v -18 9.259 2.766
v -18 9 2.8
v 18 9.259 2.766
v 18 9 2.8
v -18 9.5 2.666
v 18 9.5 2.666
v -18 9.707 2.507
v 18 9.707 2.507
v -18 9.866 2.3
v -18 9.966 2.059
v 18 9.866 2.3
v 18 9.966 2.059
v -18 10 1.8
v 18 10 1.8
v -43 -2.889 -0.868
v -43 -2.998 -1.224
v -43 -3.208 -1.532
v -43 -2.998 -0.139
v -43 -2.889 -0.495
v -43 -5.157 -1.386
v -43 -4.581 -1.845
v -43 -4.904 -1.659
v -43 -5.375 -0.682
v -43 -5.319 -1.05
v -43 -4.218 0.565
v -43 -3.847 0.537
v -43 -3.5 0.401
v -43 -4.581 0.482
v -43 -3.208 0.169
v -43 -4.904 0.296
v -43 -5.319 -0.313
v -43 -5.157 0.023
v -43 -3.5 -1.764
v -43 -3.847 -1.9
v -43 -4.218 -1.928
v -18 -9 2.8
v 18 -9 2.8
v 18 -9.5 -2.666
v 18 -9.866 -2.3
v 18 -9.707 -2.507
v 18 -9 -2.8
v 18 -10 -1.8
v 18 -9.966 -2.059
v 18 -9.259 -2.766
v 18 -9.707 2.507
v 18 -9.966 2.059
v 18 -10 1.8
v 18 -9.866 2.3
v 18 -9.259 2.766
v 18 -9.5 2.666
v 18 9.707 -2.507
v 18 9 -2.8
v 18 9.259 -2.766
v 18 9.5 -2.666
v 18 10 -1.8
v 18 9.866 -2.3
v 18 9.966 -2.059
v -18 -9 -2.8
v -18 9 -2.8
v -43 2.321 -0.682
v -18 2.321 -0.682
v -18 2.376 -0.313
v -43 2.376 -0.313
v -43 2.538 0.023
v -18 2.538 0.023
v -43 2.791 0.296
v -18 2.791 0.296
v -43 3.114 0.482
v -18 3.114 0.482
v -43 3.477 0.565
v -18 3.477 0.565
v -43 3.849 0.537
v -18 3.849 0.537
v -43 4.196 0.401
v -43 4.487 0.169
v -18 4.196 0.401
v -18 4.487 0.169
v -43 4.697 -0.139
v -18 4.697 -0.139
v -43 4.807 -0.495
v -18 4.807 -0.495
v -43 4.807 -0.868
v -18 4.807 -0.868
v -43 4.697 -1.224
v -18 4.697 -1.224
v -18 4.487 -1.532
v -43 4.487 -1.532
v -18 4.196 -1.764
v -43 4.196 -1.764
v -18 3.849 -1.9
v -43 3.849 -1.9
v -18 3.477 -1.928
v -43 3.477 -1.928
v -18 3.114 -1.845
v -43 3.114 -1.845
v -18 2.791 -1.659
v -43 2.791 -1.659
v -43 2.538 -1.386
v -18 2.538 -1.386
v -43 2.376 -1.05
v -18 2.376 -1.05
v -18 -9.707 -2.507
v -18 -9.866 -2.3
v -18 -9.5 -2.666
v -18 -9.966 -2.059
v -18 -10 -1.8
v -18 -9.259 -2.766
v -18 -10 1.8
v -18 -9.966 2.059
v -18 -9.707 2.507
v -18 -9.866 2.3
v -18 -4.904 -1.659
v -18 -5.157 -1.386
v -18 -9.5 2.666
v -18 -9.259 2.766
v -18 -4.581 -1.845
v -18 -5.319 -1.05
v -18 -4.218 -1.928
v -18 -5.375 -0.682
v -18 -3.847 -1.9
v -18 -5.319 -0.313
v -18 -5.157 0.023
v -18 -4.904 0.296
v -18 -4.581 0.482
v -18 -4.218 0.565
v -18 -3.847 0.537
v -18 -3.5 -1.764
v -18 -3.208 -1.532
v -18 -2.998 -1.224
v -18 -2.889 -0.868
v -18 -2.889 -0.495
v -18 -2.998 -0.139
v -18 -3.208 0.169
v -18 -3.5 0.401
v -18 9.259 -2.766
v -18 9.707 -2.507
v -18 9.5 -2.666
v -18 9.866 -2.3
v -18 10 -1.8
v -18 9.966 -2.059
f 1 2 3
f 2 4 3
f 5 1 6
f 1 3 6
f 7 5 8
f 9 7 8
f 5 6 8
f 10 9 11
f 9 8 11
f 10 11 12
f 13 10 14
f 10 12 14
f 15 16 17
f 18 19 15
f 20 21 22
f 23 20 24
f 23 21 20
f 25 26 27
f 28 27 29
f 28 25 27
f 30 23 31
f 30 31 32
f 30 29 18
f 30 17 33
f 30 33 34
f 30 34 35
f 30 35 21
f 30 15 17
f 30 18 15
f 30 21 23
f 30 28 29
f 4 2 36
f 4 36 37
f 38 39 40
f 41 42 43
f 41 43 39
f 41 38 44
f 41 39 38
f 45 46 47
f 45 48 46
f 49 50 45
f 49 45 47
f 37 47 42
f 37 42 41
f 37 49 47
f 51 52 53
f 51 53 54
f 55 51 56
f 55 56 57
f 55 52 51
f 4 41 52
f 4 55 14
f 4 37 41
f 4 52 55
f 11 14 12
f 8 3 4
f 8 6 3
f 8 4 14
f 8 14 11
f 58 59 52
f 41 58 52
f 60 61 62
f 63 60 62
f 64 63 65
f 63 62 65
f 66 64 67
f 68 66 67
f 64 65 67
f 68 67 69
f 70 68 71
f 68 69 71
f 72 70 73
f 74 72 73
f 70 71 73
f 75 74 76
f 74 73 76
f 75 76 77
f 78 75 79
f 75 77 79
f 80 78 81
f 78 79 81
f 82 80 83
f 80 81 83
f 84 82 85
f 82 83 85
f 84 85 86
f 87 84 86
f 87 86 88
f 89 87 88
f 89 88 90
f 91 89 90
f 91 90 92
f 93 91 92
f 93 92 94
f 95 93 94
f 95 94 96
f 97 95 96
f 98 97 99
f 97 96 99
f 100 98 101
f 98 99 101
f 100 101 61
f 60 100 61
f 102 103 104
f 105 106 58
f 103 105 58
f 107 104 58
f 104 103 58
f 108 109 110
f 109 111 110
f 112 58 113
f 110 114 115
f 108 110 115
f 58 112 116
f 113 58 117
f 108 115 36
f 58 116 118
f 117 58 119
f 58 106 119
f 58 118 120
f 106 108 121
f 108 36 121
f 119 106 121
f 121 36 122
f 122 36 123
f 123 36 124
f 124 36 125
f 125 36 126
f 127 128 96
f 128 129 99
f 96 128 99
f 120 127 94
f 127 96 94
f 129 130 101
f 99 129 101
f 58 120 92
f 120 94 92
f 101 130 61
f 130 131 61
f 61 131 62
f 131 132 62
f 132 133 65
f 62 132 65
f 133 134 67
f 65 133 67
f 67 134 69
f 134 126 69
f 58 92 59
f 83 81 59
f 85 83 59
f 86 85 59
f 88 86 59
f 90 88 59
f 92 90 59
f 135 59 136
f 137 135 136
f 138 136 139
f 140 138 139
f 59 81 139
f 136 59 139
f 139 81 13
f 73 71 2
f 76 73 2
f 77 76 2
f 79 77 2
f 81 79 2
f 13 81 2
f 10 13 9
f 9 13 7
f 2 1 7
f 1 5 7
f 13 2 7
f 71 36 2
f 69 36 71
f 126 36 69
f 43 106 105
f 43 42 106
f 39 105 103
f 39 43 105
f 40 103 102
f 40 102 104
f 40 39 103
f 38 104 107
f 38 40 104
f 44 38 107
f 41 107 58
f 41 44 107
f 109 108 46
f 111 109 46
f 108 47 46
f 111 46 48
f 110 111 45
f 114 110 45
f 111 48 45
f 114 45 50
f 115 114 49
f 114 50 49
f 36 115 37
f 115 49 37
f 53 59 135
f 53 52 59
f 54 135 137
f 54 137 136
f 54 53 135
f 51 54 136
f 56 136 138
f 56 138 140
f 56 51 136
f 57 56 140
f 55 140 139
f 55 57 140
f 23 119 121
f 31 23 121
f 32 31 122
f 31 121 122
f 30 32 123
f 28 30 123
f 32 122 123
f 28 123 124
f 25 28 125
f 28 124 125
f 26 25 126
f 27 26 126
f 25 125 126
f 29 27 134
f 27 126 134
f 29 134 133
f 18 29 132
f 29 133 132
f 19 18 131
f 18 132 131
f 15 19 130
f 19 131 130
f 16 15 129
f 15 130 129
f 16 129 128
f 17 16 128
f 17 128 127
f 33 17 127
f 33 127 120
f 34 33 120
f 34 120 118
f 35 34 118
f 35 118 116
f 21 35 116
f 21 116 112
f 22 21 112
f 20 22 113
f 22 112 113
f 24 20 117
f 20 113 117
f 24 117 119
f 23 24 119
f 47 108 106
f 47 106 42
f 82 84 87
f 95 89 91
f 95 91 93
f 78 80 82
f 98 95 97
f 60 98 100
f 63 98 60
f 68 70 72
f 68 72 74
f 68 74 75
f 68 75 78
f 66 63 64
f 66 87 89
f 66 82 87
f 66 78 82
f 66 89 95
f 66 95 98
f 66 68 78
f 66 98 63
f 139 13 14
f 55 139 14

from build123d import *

# Parameters (mm, degrees)
F0_W     = 36
F0_H     = 20
F1_DEPTH = 2.8
F2_R     = 1.25
F3_DEPTH = 25
F4_R     = 1


with BuildPart() as f1:
    # F0 (on Top) → F1 (new body, symmetric)
    with BuildSketch(Plane.XY):
        Rectangle(F0_W, F0_H)
    extrude(amount=F1_DEPTH, both=True)

    # F2 (on face) → F3 (join)
    with BuildSketch(Plane(origin=(-18, 0, 0), x_dir=(0, -1, 0), z_dir=(-1, 0, 0))):
        with Locations((-3.5708139185, -0.681526144)):
            Circle(F2_R)
        with Locations((4.1246912515, -0.681526144)):
            Circle(F2_R)
    extrude(amount=F3_DEPTH)

    # F4
    f4_edges = [f1.edges().sort_by_distance(p)[0] for p in [
        (0, -10, 2.8),
        (0, -10, -2.8),
        (0, 10, 2.8),
        (0, 10, -2.8),
    ]]
    fillet(f4_edges, radius=F4_R)


solid = f1.part
